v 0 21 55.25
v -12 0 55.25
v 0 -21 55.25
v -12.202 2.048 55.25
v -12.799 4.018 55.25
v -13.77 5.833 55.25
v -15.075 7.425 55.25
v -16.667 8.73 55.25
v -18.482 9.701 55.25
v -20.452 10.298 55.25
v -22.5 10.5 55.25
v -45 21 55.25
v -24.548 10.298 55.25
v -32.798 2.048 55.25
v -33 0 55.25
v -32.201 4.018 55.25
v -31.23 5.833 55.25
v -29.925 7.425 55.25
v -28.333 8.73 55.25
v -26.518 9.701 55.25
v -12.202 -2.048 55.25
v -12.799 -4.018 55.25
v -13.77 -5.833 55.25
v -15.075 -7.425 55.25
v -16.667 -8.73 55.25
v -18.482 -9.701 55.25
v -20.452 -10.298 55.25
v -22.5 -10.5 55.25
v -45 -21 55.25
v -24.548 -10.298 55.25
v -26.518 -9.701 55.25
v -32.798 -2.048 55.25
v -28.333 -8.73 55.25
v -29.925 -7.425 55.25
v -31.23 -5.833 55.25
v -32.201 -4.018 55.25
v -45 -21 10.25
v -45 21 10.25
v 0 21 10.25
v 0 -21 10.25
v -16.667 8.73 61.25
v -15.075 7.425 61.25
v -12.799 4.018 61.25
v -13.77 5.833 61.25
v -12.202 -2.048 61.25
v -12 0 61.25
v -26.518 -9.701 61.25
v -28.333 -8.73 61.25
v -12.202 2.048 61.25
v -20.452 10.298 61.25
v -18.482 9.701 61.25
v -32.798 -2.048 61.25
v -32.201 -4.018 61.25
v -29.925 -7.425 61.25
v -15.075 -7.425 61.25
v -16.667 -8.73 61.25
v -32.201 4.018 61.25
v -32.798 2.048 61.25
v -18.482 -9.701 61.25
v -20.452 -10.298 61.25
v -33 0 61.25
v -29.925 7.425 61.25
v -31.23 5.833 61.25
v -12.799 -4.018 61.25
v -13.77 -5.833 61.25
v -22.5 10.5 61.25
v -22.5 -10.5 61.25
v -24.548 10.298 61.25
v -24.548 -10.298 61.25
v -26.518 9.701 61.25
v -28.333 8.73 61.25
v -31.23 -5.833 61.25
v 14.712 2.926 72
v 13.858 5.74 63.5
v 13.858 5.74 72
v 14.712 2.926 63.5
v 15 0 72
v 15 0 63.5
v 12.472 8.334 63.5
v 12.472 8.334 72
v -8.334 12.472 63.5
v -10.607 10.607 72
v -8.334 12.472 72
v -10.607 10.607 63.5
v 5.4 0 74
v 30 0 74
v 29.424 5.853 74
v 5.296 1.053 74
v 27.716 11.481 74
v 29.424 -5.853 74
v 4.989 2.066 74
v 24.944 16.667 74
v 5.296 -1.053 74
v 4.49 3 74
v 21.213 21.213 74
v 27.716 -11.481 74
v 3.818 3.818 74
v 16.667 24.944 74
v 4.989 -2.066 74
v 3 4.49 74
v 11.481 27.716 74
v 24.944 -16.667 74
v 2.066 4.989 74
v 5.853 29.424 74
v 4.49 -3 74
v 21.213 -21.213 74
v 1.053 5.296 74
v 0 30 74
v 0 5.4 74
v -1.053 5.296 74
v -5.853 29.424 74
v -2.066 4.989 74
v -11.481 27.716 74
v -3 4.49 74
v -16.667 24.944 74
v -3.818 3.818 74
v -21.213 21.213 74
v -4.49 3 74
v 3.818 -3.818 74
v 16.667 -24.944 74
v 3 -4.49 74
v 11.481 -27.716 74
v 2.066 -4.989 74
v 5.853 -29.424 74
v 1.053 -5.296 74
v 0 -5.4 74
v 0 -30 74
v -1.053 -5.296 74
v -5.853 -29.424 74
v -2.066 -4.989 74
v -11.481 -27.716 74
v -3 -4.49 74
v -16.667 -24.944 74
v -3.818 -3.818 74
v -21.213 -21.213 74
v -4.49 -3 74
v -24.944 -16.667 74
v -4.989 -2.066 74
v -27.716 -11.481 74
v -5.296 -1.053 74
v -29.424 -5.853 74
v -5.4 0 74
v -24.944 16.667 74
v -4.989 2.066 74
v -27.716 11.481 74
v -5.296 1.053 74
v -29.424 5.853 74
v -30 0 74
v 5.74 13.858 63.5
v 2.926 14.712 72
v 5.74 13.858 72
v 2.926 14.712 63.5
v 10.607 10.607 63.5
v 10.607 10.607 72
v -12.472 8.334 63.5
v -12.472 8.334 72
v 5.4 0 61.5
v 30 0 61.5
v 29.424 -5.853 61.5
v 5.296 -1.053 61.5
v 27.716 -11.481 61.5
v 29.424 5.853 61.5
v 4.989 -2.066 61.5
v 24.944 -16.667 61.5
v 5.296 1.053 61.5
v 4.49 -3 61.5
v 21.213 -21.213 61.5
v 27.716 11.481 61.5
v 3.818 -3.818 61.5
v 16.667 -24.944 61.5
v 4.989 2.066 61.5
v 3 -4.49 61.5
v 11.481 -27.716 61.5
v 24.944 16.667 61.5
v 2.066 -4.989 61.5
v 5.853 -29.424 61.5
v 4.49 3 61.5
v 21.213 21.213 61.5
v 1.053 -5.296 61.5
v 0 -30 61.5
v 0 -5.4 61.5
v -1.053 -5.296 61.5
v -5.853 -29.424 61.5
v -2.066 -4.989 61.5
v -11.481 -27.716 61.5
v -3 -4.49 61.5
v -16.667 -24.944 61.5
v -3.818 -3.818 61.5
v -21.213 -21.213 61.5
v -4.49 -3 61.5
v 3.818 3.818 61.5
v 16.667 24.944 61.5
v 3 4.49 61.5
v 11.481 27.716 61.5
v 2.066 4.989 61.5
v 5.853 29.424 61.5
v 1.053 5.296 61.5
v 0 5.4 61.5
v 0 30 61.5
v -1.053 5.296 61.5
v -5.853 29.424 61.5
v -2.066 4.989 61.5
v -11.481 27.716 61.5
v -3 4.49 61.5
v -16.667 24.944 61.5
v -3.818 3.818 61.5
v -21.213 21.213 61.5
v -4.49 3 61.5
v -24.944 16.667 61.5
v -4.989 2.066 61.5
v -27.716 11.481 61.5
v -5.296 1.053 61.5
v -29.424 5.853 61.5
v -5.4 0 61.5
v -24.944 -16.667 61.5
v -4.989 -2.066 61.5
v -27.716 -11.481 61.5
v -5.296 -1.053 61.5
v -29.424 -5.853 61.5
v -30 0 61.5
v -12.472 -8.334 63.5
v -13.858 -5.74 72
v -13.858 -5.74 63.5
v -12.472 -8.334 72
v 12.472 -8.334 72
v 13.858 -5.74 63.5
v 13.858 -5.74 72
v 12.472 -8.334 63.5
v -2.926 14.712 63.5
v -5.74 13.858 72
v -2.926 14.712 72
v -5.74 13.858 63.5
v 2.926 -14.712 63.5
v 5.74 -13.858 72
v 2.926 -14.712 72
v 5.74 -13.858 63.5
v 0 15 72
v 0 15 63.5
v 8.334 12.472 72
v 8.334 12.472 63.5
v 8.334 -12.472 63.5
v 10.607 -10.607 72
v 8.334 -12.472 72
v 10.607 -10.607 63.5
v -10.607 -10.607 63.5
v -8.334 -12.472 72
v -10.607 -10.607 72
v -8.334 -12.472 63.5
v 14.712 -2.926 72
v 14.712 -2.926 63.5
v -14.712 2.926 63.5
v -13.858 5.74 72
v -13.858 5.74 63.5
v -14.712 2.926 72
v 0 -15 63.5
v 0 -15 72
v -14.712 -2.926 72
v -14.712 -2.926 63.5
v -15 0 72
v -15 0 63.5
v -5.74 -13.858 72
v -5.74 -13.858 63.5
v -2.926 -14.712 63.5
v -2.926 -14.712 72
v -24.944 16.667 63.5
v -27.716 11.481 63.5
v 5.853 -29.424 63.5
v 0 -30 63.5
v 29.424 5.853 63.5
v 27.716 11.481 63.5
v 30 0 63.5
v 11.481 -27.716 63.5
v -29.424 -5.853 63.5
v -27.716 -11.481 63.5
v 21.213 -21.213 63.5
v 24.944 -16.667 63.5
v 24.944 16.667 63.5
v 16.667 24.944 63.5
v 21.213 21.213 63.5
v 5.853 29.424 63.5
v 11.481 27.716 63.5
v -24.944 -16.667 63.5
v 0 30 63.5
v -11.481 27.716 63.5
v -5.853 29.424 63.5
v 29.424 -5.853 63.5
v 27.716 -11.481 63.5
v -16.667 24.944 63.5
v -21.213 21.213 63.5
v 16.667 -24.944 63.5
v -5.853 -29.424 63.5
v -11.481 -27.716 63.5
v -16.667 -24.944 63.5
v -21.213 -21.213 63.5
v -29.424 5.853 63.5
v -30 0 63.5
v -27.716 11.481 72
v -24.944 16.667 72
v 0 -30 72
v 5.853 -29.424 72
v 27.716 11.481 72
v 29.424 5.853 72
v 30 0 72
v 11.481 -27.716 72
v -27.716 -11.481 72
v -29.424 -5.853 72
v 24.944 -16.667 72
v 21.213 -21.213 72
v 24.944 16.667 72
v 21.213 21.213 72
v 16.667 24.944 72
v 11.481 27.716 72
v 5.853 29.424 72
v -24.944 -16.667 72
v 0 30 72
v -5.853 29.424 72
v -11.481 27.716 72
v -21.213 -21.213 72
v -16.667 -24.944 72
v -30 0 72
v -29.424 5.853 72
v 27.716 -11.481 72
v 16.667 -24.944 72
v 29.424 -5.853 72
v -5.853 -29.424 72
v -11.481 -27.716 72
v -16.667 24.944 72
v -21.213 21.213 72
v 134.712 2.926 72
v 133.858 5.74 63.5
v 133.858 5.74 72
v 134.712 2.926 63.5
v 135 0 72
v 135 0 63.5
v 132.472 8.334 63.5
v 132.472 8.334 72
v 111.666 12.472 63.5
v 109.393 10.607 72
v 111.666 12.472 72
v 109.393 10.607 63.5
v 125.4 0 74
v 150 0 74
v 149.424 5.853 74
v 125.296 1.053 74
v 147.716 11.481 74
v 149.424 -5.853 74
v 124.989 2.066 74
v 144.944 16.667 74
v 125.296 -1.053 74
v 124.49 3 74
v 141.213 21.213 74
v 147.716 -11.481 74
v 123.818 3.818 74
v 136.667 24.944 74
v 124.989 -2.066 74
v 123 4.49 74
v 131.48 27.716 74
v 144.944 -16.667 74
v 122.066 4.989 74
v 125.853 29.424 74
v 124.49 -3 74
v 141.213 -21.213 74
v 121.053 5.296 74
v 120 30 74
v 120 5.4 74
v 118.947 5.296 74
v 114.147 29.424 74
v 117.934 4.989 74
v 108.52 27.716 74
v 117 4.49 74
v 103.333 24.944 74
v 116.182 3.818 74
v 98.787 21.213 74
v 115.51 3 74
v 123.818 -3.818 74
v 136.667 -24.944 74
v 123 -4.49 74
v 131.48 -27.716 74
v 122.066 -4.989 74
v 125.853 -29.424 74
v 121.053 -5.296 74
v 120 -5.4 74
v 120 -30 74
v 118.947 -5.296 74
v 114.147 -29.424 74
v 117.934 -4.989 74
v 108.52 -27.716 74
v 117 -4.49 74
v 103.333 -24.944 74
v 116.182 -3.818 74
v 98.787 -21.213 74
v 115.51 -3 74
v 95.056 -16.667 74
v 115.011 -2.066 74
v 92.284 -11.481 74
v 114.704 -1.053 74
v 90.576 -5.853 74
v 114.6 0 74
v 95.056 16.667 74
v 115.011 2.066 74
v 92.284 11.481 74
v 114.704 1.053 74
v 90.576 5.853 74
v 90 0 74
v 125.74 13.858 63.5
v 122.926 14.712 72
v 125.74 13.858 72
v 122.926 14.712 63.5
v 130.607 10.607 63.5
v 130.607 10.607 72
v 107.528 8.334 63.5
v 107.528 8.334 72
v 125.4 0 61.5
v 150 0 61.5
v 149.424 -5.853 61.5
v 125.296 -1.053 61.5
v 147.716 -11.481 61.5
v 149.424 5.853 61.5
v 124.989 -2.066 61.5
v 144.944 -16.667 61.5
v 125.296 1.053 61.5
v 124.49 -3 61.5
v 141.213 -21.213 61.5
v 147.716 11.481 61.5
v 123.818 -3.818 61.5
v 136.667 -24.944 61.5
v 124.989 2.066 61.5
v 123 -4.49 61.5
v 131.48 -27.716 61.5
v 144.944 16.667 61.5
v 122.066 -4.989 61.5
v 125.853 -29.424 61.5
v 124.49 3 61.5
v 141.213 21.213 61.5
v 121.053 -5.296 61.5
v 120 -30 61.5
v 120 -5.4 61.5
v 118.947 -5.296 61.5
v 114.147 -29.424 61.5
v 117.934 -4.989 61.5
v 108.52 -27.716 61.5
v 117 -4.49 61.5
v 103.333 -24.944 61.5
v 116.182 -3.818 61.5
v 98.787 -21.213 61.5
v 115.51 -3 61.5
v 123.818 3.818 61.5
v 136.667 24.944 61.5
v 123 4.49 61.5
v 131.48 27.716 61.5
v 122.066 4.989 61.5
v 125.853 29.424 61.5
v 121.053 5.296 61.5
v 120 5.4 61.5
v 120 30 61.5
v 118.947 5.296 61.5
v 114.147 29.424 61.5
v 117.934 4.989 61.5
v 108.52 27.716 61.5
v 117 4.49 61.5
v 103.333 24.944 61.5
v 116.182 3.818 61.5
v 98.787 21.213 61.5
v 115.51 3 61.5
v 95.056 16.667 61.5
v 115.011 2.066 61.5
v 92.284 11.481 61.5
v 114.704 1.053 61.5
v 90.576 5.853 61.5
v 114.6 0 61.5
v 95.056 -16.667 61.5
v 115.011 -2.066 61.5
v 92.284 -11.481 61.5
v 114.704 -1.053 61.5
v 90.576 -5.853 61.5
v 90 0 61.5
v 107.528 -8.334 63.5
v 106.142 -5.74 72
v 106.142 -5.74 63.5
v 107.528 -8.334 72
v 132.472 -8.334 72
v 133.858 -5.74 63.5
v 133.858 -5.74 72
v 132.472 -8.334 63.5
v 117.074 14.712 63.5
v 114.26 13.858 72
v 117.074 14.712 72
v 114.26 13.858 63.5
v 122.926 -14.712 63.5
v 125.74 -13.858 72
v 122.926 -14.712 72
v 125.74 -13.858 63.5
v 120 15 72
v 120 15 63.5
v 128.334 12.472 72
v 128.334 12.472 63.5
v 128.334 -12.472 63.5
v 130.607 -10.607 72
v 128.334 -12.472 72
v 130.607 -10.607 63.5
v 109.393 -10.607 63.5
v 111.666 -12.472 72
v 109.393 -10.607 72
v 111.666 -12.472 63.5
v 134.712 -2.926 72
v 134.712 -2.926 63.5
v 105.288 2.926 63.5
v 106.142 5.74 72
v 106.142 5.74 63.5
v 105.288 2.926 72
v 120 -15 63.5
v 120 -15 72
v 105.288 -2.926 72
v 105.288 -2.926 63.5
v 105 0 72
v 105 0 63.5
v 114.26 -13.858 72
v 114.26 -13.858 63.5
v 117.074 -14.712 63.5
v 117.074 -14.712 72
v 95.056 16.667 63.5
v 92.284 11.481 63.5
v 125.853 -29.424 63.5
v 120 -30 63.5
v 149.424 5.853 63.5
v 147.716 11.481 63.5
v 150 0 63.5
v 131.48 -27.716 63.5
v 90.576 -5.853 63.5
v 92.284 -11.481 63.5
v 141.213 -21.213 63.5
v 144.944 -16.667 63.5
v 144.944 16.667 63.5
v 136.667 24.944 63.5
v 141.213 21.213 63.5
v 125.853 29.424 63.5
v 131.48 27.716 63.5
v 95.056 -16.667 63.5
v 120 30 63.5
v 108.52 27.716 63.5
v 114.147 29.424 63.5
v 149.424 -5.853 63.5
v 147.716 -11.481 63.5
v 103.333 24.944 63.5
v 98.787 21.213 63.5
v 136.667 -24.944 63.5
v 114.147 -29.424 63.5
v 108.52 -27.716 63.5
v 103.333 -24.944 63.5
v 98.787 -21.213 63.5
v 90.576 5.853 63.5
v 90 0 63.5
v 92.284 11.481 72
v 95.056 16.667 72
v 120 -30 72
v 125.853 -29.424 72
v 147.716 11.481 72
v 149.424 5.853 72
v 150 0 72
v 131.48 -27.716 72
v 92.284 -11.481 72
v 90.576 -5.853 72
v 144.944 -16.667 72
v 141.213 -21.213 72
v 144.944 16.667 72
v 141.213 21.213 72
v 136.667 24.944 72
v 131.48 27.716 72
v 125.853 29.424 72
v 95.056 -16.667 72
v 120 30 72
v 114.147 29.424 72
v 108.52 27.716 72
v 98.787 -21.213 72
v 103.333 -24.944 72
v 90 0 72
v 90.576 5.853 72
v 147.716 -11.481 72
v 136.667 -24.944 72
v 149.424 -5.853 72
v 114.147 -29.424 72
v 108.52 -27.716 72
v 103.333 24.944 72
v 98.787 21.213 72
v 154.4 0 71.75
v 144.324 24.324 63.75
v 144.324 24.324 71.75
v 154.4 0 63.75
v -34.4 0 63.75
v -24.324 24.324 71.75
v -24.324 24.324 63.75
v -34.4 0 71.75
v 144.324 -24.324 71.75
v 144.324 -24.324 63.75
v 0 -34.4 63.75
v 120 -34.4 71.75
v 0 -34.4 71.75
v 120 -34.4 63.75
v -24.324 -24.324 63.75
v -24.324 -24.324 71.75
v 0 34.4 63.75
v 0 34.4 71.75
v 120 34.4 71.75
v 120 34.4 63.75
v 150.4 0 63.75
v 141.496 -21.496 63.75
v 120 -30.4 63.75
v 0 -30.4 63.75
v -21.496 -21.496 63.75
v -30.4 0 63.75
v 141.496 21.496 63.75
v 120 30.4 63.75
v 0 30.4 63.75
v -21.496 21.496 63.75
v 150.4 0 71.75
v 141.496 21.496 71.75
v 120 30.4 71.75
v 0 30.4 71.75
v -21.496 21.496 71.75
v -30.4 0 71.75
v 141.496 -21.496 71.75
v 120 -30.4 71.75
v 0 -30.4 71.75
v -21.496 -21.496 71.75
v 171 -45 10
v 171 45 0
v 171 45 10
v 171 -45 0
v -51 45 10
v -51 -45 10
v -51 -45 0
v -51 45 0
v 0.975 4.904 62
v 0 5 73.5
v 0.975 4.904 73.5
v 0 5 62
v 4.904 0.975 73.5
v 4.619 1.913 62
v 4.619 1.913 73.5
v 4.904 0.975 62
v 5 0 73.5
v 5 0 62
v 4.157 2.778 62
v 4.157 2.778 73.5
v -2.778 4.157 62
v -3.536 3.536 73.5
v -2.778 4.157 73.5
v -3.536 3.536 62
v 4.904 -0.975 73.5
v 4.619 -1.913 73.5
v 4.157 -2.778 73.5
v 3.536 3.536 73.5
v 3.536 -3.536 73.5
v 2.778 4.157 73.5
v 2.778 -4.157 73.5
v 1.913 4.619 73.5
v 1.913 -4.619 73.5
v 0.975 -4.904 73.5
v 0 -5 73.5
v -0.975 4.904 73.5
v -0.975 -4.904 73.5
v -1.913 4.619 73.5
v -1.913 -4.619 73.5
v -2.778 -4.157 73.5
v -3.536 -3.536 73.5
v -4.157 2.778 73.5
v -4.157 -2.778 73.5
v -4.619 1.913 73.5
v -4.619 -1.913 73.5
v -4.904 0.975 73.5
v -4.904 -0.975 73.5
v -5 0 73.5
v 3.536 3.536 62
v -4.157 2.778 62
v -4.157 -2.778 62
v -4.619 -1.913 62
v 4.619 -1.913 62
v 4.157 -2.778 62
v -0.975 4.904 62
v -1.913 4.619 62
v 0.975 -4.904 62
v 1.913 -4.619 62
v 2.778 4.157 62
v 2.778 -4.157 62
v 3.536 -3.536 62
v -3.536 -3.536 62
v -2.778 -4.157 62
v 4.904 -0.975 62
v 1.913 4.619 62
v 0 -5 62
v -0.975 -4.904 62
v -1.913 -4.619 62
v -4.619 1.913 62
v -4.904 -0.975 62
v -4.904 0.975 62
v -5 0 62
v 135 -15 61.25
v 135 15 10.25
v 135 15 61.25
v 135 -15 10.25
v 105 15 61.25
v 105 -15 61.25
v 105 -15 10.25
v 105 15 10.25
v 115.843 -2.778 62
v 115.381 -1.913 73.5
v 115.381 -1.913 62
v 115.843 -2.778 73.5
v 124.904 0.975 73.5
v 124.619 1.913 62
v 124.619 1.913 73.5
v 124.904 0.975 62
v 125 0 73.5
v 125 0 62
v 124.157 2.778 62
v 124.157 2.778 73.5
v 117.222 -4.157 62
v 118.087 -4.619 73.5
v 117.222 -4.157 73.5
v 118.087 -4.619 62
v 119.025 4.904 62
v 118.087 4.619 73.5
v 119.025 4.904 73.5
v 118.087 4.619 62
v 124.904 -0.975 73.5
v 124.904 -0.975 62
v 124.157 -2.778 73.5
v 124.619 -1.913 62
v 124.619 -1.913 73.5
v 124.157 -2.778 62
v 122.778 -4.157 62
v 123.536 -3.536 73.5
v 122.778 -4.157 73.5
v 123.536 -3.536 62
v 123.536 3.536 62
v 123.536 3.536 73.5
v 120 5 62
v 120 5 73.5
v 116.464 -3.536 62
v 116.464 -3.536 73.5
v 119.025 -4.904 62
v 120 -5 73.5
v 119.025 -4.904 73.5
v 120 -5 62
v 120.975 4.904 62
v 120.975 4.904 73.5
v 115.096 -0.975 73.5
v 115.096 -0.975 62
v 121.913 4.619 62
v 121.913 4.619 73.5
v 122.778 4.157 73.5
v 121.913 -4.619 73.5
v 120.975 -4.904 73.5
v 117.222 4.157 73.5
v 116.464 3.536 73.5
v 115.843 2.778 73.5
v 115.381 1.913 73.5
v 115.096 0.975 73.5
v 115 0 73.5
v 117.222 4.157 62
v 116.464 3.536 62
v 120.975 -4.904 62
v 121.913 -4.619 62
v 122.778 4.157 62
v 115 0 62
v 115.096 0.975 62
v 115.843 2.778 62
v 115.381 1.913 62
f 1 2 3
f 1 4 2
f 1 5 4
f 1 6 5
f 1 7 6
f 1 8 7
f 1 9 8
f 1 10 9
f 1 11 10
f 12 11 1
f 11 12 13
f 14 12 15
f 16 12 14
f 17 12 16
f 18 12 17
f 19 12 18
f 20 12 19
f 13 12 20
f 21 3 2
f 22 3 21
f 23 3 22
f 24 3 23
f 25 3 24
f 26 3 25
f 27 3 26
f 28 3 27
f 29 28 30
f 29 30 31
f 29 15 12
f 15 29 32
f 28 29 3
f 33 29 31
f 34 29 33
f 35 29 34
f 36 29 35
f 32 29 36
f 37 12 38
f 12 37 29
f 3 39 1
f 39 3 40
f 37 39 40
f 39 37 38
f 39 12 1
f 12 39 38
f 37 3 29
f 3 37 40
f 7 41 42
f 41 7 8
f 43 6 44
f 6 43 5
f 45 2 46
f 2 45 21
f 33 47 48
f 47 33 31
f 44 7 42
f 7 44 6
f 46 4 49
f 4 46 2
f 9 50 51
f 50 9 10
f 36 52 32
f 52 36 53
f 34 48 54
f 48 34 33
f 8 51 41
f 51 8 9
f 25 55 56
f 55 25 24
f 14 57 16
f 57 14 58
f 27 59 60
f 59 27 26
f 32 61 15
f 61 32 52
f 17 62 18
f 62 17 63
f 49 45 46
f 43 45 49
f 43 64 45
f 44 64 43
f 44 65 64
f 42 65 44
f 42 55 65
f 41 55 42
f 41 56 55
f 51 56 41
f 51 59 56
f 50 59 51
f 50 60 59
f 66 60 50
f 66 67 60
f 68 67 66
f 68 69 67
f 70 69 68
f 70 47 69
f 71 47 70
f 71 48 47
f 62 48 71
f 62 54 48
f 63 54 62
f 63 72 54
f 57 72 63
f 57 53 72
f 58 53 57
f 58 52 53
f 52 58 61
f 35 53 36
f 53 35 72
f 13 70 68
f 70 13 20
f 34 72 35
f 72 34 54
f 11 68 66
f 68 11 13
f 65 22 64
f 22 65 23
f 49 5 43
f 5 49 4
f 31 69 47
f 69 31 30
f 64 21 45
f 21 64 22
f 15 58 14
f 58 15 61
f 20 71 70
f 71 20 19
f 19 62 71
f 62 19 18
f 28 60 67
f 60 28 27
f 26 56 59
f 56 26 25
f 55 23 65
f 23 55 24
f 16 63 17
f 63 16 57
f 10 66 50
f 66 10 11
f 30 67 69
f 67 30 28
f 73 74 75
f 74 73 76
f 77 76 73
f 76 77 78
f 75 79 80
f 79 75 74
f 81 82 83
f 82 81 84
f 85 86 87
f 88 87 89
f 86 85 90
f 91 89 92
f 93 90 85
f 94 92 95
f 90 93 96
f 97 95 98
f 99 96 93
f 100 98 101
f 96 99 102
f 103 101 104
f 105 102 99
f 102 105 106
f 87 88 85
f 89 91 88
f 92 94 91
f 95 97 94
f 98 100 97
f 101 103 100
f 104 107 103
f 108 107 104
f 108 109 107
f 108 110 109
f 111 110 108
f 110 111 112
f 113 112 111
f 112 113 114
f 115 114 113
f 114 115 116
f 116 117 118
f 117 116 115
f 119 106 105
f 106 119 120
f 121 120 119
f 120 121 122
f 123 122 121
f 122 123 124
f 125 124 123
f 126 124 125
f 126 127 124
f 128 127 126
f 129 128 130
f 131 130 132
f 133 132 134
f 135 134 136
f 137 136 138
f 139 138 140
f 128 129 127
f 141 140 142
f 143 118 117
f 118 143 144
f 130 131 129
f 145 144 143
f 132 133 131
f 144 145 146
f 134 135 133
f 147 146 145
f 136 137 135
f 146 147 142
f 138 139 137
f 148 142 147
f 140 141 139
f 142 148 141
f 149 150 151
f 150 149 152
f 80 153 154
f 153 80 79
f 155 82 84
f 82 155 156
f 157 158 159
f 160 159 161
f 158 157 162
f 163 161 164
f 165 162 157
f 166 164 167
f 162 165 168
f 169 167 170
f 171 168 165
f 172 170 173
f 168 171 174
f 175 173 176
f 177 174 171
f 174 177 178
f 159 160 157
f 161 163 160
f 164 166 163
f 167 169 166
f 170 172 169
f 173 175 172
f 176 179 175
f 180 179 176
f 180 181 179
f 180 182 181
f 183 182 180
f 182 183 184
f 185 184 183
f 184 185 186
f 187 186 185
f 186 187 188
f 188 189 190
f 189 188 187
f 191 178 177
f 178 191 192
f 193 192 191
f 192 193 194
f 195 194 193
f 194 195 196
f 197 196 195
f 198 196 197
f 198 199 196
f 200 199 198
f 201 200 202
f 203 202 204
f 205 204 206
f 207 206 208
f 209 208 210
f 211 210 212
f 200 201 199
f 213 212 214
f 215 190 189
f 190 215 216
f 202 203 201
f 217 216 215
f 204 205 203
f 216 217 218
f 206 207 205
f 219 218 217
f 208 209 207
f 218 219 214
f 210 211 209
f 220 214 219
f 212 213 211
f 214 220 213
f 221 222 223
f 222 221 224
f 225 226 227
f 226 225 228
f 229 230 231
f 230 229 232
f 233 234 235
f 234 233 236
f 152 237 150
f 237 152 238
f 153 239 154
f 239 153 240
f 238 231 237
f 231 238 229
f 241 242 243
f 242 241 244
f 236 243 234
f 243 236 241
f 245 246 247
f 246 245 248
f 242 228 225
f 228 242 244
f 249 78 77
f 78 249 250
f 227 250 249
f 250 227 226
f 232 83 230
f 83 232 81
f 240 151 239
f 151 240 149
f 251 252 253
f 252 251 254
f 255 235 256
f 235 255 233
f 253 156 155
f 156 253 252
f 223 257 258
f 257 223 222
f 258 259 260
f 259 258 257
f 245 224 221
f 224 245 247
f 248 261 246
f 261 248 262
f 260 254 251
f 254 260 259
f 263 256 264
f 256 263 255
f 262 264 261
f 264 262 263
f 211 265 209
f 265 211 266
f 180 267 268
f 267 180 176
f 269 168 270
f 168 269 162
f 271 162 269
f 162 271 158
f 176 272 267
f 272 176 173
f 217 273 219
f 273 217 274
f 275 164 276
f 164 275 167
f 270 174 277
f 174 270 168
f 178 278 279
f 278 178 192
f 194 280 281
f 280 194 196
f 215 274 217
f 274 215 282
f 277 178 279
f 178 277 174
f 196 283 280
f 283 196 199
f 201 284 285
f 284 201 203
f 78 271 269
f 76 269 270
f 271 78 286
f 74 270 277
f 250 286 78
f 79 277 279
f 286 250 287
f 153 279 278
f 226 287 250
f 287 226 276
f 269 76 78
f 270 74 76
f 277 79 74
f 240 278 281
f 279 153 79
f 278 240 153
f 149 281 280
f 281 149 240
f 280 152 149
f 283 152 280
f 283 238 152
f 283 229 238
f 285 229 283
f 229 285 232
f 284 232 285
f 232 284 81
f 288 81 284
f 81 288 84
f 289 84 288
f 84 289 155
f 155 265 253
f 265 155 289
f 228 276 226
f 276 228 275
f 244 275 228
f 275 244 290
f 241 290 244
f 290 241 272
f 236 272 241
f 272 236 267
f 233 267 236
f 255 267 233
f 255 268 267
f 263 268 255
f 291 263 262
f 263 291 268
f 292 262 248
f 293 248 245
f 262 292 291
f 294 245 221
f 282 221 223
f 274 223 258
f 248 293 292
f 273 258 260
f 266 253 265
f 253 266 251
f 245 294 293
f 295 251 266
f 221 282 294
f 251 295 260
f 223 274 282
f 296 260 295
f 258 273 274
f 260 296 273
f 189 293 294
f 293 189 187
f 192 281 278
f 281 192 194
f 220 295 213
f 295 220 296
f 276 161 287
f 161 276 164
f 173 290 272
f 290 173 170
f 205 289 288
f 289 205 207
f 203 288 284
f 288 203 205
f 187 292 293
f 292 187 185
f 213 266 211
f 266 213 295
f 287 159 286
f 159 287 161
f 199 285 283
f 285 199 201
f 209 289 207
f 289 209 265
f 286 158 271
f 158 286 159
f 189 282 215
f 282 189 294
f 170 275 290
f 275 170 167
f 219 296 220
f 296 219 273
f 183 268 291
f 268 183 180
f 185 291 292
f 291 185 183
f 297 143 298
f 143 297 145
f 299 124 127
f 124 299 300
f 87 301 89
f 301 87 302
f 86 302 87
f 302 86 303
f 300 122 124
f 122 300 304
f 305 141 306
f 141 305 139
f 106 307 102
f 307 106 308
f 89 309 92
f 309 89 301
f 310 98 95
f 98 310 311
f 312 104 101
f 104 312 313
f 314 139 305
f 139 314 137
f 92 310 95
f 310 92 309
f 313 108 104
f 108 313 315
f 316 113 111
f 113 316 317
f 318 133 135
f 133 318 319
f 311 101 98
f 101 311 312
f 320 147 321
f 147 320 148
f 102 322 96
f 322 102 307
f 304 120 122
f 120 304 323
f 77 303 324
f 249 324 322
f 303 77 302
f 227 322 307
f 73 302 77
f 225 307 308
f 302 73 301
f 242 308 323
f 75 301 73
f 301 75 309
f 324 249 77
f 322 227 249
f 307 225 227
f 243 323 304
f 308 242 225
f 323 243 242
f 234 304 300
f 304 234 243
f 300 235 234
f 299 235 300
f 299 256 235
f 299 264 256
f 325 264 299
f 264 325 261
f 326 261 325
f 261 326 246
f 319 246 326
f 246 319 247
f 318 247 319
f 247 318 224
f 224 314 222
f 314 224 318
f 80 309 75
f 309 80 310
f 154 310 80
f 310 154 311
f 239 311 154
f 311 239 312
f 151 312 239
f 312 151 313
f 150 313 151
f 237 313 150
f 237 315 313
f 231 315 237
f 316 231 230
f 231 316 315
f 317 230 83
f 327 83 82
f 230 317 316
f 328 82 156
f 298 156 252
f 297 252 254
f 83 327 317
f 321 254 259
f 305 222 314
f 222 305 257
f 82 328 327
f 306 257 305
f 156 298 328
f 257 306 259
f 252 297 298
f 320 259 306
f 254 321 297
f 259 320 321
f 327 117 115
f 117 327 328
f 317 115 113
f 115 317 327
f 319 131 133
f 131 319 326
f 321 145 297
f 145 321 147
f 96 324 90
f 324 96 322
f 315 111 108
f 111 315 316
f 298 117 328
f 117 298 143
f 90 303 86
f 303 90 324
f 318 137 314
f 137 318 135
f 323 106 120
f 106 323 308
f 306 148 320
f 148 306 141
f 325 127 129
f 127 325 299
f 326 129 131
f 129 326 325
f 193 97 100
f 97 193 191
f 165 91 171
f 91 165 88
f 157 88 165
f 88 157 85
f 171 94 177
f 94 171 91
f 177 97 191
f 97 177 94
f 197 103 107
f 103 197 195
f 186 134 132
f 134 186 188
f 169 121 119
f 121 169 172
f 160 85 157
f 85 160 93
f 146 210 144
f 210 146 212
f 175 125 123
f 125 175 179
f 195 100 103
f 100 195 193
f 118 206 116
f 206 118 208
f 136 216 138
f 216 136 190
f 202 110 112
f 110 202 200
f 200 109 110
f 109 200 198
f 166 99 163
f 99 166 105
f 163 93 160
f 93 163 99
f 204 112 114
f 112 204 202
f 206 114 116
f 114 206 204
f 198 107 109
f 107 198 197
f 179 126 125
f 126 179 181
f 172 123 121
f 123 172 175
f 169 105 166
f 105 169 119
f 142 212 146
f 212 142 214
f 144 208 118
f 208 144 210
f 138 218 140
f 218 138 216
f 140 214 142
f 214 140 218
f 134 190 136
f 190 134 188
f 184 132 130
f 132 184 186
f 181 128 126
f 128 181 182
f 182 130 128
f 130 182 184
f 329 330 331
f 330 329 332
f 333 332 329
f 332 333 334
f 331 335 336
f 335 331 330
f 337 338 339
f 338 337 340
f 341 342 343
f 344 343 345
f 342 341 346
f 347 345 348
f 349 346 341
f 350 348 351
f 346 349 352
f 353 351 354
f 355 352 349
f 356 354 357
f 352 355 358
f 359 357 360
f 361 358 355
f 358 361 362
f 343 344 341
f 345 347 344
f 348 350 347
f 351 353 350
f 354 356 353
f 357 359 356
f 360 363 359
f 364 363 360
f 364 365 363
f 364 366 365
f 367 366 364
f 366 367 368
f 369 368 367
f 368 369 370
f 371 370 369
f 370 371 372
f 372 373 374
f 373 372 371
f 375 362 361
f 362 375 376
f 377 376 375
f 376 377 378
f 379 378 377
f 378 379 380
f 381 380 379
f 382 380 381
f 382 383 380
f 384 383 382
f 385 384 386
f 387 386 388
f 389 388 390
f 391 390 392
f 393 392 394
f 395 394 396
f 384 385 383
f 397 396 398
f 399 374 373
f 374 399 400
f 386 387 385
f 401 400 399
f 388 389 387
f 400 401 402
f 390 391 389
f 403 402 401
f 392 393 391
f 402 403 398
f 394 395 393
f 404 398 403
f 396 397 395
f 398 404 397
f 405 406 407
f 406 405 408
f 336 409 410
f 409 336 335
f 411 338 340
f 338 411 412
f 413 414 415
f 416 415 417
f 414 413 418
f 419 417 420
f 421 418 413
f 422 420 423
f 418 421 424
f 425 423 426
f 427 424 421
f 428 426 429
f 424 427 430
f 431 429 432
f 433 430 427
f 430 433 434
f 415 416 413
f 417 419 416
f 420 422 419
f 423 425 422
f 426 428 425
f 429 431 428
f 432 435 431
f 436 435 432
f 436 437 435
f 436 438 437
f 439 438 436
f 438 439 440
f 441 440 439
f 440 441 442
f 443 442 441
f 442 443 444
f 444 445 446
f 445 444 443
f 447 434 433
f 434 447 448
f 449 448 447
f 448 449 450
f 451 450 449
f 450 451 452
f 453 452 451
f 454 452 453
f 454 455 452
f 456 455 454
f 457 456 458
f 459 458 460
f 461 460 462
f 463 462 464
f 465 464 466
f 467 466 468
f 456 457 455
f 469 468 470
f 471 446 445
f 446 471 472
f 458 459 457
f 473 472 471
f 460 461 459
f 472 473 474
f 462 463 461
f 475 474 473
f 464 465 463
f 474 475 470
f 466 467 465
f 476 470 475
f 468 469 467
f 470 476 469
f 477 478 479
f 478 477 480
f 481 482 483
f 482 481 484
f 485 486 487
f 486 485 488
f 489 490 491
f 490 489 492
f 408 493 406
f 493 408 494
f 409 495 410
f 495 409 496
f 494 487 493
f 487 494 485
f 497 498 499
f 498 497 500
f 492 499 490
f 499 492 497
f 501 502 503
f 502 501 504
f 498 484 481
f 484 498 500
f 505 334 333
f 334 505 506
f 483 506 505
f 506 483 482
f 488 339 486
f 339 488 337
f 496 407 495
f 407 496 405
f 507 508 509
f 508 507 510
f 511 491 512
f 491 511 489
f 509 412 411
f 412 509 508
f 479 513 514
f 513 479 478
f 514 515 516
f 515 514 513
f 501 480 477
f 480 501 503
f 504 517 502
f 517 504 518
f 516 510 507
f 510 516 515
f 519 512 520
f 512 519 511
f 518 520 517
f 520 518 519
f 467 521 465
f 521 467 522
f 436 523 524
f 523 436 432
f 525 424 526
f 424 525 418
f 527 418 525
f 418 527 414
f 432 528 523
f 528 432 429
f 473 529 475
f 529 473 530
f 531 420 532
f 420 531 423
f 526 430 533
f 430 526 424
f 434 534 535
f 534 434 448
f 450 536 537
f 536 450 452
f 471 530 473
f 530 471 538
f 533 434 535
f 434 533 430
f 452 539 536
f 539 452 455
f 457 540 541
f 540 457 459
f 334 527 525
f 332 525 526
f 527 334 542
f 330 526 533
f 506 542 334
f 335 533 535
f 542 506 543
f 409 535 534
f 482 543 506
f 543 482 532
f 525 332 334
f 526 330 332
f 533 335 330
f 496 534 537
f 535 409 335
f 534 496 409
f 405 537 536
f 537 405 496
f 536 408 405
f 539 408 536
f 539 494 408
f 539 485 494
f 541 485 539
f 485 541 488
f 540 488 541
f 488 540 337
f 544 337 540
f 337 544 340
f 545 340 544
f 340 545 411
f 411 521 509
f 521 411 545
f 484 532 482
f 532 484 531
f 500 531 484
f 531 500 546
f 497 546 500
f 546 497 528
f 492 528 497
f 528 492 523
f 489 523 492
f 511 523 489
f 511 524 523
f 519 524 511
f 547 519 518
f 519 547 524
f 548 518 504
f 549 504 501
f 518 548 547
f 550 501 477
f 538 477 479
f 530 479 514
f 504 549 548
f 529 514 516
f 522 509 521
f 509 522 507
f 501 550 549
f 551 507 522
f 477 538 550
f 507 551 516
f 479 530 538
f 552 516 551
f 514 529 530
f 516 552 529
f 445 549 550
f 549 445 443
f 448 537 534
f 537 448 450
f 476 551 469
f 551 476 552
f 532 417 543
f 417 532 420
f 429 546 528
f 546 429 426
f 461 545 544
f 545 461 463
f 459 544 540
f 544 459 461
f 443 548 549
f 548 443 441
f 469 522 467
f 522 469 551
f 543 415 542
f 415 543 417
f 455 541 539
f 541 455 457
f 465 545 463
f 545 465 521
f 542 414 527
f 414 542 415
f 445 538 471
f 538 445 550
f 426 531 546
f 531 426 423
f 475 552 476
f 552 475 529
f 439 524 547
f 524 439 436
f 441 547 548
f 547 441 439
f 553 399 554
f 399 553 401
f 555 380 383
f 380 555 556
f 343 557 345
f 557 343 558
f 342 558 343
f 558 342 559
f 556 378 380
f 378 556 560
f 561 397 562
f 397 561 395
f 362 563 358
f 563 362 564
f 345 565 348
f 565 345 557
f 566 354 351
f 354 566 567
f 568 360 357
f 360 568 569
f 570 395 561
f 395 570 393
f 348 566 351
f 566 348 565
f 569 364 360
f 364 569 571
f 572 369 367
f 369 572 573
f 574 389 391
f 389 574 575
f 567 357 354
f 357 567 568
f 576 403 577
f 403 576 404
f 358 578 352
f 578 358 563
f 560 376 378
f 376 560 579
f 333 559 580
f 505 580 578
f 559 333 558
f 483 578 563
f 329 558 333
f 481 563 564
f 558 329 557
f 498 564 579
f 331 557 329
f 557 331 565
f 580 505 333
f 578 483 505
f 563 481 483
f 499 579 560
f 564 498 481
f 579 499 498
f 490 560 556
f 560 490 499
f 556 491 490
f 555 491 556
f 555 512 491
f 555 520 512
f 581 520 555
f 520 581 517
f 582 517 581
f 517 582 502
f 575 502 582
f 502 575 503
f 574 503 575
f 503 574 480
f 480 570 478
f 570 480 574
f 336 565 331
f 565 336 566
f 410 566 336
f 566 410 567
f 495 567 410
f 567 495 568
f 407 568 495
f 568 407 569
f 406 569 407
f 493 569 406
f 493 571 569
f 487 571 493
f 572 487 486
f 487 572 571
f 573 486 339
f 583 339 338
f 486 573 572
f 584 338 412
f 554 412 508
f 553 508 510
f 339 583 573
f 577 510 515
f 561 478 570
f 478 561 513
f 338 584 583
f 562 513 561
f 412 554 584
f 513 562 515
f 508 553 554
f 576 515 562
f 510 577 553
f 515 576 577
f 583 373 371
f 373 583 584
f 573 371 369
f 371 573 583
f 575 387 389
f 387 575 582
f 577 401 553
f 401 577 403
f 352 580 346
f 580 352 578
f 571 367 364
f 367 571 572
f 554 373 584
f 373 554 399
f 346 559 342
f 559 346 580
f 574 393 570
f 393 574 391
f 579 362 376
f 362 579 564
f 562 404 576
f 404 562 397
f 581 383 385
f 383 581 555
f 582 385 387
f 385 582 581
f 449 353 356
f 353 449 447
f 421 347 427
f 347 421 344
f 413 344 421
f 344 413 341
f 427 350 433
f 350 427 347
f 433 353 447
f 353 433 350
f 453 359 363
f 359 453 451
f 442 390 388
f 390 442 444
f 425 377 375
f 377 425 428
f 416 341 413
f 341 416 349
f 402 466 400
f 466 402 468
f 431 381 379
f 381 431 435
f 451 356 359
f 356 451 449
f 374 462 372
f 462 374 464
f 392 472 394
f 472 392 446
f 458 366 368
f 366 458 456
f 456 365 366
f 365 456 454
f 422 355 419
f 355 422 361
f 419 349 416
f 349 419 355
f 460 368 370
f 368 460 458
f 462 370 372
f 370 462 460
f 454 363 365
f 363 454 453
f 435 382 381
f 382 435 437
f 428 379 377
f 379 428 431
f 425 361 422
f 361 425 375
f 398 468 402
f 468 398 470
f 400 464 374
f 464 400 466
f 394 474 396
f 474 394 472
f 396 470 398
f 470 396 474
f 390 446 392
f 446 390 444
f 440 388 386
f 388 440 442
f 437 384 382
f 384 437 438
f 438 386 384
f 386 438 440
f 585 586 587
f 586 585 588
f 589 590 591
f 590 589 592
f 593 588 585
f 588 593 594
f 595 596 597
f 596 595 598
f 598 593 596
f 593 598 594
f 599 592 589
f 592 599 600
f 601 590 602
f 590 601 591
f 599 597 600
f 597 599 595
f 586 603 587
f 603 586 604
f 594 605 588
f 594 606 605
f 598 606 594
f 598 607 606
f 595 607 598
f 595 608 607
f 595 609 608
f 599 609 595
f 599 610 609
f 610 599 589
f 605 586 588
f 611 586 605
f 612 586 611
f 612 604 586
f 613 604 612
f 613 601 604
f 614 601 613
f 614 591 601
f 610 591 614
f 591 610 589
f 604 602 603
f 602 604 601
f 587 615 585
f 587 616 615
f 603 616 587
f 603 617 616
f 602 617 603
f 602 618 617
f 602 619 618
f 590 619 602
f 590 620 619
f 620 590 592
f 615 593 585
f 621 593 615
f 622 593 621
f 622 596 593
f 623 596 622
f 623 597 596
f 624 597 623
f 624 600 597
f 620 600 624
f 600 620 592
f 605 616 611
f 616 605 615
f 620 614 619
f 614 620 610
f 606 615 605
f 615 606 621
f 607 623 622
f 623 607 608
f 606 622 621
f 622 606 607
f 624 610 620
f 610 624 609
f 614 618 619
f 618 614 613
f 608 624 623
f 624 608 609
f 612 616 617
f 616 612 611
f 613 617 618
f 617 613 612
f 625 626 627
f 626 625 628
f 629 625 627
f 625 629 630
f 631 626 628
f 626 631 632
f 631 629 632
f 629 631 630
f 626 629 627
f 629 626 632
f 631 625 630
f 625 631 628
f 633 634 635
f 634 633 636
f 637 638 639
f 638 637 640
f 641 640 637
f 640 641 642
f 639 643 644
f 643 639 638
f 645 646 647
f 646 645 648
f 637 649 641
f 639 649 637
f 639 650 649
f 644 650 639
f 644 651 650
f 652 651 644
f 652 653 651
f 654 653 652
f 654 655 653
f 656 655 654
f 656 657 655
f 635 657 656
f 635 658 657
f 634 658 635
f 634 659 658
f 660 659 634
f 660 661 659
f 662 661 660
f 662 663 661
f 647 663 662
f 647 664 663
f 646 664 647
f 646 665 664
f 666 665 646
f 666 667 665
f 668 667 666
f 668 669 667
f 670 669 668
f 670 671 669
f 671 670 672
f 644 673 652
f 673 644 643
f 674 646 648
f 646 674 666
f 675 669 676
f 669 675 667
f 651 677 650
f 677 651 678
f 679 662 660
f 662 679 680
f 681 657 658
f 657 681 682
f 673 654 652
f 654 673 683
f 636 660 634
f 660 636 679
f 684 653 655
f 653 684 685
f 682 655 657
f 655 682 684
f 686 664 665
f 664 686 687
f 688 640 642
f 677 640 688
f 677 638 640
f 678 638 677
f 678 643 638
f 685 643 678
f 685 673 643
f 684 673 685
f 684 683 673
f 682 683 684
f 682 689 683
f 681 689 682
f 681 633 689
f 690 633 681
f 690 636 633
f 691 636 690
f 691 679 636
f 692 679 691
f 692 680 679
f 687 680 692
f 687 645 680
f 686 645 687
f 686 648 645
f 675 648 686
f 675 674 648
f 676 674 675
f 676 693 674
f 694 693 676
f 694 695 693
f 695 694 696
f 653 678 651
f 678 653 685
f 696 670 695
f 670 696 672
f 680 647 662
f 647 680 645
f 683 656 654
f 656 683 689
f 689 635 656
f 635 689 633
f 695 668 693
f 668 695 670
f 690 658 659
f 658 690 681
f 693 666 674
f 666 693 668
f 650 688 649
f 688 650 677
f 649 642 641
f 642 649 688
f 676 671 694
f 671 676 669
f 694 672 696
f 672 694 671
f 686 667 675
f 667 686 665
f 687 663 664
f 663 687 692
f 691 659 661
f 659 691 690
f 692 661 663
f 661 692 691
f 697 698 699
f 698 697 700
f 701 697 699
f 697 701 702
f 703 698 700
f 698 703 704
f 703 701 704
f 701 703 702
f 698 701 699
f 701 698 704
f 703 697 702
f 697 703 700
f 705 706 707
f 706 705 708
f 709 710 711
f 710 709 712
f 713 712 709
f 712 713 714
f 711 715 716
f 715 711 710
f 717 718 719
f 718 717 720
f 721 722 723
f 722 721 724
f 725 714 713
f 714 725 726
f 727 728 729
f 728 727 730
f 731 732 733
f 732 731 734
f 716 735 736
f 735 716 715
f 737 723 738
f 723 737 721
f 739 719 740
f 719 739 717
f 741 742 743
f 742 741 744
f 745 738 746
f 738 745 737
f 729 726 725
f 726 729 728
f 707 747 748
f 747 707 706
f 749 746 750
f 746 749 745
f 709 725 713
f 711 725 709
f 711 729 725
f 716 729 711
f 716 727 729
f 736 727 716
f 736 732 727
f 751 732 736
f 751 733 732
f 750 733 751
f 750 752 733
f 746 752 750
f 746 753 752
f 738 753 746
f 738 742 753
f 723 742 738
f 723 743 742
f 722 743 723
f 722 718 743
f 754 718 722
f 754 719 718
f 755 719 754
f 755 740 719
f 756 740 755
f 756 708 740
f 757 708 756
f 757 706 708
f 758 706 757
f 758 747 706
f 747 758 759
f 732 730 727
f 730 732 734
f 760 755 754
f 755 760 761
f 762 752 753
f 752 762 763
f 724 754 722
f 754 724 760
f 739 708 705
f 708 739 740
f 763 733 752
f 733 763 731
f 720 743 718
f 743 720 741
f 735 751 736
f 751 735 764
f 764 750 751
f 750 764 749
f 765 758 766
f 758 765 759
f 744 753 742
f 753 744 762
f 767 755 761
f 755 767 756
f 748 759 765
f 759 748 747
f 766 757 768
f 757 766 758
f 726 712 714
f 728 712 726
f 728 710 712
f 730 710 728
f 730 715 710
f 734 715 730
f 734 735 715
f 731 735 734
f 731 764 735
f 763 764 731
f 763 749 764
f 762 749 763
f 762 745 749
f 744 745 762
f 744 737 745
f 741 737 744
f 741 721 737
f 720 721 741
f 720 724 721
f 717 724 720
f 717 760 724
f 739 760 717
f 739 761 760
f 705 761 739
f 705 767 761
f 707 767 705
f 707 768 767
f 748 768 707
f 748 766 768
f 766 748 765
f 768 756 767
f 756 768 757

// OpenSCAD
$fn = 32;

// ------------------------------------------------------------------------
// Motor belt drive: span 120 mm, pulleys d60, belt 8 mm wide
// Every part is its own module, assembly() places every instance.
// ------------------------------------------------------------------------

// --- part 1 ---
module base_plate() {
  difference() {
    translate([-111, -45, 0]) cube([222, 90, 10]);
  }
}

// --- part 2 ---
module motor() {
  union() {
    translate([-22.5, -21, 0]) cube([45, 42, 45]);
    translate([25.5, 0, 22.5]) rotate([0, 90, 0]) cylinder(h = 6, d = 21, center = true);
  }
}

// --- part 3 ---
module drive_shaft() {
  translate([0, 0, -5.75]) cylinder(h = 11.5, d = 10);
}

// --- part 4 ---
module pulley_drive() {
  difference() {
    union() {
      cylinder(h = 12.5, d = 30);
      cylinder(h = 2, d = 60);
      translate([0, 0, 10.5]) cylinder(h = 2, d = 60);
    }
    translate([0, 0, -1]) cylinder(h = 14.5, d = 10.8);
  }
}

// --- part 5 ---
module idler_post() {
  translate([-15, -15, 0]) cube([30, 30, 51]);
}

// --- part 6 ---
module driven_shaft() {
  translate([0, 0, -5.75]) cylinder(h = 11.5, d = 10);
}

// --- part 7 ---
module pulley_driven() {
  difference() {
    union() {
      cylinder(h = 12.5, d = 30);
      cylinder(h = 2, d = 60);
      translate([0, 0, 10.5]) cylinder(h = 2, d = 60);
    }
    translate([0, 0, -1]) cylinder(h = 14.5, d = 10.8);
  }
}

// --- part 8 ---
module drive_belt() {
  difference() {
    linear_extrude(height = 8) polygon(points = concat([for (a = [90 : 45 : 270]) [34.4 * cos(a), 34.4 * sin(a)]], [for (a = [270 : 45 : 450]) [120 + 34.4 * cos(a), 34.4 * sin(a)]]));
    translate([0, 0, -1]) linear_extrude(height = 10) polygon(points = concat([for (a = [90 : 45 : 270]) [30.4 * cos(a), 30.4 * sin(a)]], [for (a = [270 : 45 : 450]) [120 + 30.4 * cos(a), 30.4 * sin(a)]]));
  }
}

// --- assembly ---
module assembly() {
  color([0.80, 0.24, 0.20]) translate([60, 0, 0]) rotate([0, 0, 0]) base_plate();
  color([0.20, 0.45, 0.75]) translate([0, 0, 32.75]) rotate([0, 270, 0]) motor();
  color([0.25, 0.62, 0.32]) translate([0, 0, 67.75]) rotate([0, 0, 0]) drive_shaft();
  color([0.92, 0.70, 0.18]) translate([0, 0, 61.5]) rotate([0, 0, 0]) pulley_drive();
  color([0.58, 0.35, 0.70]) translate([120, 0, 10.25]) rotate([0, 0, 0]) idler_post();
  color([0.16, 0.66, 0.66]) translate([120, 0, 67.75]) rotate([0, 0, 0]) driven_shaft();
  color([0.85, 0.48, 0.18]) translate([120, 0, 61.5]) rotate([0, 0, 0]) pulley_driven();
  color([0.55, 0.60, 0.65]) translate([0, 0, 63.75]) rotate([0, 0, 0]) drive_belt();
}

assembly();
